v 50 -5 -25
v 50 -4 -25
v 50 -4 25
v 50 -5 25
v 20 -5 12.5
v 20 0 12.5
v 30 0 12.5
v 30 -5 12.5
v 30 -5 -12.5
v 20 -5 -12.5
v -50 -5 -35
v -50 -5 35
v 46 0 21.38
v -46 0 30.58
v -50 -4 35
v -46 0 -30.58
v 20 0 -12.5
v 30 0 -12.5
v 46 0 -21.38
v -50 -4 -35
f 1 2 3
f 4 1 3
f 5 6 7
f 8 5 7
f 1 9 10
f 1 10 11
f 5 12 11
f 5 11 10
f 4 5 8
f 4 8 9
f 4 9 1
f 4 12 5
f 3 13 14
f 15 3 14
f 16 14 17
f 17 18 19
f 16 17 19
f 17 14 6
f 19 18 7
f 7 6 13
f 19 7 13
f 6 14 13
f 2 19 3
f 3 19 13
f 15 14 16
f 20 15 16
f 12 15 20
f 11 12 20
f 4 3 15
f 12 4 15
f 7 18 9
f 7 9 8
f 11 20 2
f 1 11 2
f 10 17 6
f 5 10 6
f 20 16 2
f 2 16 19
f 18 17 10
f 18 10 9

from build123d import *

# Parameters (mm, degrees)
SKETCH_W     = 10
SKETCH_H     = 25
PAD_DEPTH    = 5
CHAMFER_SIZE = 4


with BuildPart() as part:
    # Sketch → Pad (new body)
    with BuildSketch(Plane.XZ):
        Polygon((-50, -35), (50, -25), (50, 25), (-50, 35), align=None)
        with Locations((25, 0)):
            Rectangle(SKETCH_W, SKETCH_H, mode=Mode.SUBTRACT)
    extrude(amount=PAD_DEPTH)

    # Chamfer
    chamfer_edges = [part.edges().sort_by_distance(p)[0] for p in [
        (0, 0, 30),
        (50, 0, 0),
        (0, 0, -30),
        (-50, 0, 0),
    ]]
    chamfer(chamfer_edges, length=CHAMFER_SIZE)


solid = part.part
